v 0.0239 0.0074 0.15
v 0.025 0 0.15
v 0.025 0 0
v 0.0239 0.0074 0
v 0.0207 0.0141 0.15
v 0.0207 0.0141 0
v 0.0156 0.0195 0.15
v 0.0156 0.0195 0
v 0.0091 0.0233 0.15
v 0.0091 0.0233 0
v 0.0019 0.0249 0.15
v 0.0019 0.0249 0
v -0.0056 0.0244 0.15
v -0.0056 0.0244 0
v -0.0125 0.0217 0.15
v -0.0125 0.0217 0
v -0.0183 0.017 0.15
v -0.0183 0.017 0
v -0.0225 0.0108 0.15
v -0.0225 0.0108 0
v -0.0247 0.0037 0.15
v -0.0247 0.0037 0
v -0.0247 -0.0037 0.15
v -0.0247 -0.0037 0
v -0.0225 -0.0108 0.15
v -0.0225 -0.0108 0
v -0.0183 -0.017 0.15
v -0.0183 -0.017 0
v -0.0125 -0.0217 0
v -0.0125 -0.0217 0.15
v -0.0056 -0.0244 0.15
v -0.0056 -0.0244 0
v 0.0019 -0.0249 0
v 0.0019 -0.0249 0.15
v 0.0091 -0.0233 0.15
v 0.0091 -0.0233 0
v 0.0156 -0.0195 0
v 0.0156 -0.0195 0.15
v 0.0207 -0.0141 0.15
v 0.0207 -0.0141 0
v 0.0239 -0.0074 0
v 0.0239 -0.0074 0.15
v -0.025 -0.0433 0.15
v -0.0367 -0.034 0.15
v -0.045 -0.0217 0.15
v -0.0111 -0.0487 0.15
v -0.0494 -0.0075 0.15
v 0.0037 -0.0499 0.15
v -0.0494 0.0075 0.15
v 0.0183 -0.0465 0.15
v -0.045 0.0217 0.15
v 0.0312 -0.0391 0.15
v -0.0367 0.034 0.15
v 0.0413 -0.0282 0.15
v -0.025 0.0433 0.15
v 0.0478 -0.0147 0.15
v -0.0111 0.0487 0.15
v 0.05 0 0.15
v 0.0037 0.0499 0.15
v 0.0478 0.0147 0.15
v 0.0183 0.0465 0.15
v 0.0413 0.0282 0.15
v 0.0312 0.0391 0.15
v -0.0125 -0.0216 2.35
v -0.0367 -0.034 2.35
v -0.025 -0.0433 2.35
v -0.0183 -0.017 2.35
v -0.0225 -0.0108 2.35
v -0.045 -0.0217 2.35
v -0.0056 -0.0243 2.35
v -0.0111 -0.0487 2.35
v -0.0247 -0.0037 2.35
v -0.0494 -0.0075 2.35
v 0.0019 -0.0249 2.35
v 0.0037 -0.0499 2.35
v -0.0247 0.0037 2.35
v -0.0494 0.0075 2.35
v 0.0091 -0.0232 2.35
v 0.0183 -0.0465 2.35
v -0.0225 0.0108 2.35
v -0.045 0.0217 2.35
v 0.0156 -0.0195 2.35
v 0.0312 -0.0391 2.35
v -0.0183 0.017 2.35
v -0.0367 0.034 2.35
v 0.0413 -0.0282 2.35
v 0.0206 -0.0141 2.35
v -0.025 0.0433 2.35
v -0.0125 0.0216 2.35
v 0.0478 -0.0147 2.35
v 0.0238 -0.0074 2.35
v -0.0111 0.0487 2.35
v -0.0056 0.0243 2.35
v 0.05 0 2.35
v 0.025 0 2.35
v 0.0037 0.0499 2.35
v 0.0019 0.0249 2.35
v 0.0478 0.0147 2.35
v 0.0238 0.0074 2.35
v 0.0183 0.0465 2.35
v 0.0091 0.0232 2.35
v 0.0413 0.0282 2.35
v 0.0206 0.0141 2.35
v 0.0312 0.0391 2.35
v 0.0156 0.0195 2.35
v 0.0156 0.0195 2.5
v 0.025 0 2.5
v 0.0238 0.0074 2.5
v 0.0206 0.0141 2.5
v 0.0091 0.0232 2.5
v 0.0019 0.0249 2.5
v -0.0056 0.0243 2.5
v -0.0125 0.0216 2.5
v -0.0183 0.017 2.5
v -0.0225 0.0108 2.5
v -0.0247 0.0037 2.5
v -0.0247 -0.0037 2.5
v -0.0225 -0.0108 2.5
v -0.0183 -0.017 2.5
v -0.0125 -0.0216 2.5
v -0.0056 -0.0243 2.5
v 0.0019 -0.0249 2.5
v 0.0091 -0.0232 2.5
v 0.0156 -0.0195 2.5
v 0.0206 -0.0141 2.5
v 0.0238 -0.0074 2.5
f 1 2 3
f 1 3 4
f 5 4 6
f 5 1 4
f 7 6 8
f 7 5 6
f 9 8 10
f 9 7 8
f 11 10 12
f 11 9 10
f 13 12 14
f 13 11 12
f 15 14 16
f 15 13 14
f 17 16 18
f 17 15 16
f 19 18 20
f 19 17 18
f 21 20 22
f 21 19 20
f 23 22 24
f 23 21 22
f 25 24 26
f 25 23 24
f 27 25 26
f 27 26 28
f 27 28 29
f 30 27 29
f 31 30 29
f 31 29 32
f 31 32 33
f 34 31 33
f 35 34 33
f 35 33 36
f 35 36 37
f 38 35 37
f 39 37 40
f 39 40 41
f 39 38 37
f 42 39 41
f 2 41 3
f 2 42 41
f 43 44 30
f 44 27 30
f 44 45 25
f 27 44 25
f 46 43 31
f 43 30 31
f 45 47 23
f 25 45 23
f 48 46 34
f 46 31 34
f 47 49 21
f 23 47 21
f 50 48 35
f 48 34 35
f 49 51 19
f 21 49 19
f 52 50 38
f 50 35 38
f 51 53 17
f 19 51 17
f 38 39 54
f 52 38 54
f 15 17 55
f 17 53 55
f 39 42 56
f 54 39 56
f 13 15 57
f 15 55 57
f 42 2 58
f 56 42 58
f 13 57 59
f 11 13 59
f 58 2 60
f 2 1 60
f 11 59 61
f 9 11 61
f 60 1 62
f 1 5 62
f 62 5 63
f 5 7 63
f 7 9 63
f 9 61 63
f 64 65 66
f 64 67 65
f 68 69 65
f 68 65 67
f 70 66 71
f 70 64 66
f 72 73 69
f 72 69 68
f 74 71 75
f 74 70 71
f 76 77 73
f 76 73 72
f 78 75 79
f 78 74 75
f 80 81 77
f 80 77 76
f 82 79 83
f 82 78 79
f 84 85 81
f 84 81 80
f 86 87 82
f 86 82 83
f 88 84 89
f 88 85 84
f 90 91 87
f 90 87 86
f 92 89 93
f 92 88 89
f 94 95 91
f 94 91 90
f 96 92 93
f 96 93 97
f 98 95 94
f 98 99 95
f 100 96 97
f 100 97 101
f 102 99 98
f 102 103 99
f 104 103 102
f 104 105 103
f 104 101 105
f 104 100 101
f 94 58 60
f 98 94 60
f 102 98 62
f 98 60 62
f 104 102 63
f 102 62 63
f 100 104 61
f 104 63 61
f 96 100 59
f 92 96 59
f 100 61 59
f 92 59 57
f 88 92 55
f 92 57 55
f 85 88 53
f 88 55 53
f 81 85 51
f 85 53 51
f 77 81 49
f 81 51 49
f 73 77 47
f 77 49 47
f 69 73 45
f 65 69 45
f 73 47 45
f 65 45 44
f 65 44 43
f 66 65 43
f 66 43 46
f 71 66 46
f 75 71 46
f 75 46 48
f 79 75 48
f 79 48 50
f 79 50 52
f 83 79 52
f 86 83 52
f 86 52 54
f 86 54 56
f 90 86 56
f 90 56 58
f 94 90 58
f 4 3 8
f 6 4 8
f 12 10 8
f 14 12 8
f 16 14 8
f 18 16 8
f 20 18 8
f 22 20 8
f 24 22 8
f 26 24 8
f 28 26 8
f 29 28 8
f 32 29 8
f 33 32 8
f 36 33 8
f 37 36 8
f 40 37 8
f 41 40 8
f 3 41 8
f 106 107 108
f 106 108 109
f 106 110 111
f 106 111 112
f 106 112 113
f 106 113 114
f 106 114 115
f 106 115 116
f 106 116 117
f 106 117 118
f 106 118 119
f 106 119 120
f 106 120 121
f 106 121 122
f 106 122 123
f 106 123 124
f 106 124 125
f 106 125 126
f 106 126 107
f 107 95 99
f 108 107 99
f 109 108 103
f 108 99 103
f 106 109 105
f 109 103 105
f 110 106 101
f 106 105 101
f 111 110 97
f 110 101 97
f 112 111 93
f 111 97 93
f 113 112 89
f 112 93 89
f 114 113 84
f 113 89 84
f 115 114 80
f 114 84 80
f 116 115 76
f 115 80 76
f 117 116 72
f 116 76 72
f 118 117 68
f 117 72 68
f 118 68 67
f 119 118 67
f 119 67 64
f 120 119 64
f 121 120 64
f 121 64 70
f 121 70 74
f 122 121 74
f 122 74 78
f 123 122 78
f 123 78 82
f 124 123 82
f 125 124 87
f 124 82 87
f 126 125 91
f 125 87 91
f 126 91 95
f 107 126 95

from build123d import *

# Parameters (mm, degrees)
CROQUIS1_R              = 0.05
SALIENTE_EXTRUIR1_DEPTH = 2.5
CROQUIS3_R              = 0.05
CORTAR_EXTRUIR1_DEPTH   = 3.351063589
CROQUIS4_R              = 0.025
SALIENTE_EXTRUIR2_DEPTH = 0.15
CROQUIS5_R              = 0.05
CORTAR_EXTRUIR2_DEPTH   = 0.15
CROQUIS6_R              = 0.024951655
SALIENTE_EXTRUIR3_DEPTH = 0.15


with BuildPart() as part:
    # Croquis1 → Saliente-Extruir1 (new body)
    with BuildSketch(Plane.XY):
        Circle(CROQUIS1_R)
    extrude(amount=SALIENTE_EXTRUIR1_DEPTH)

    # Croquis3 → Cortar-Extruir1 (cut, through all)
    with BuildSketch(Plane.XY.offset(0.15)):
        Circle(CROQUIS3_R)
    extrude(amount=-CORTAR_EXTRUIR1_DEPTH, mode=Mode.SUBTRACT)

    # Croquis4 → Saliente-Extruir2 (add)
    with BuildSketch(Plane.XY.offset(0.15)):
        Circle(CROQUIS4_R)
    extrude(amount=-SALIENTE_EXTRUIR2_DEPTH)

    # Croquis5 → Cortar-Extruir2 (cut)
    with BuildSketch(Plane.XY.offset(2.35)):
        Circle(CROQUIS5_R)
    extrude(amount=CORTAR_EXTRUIR2_DEPTH, mode=Mode.SUBTRACT)

    # Croquis6 → Saliente-Extruir3 (add)
    with BuildSketch(Plane.XY.offset(2.35)):
        Circle(CROQUIS6_R)
    extrude(amount=SALIENTE_EXTRUIR3_DEPTH)


solid = part.part
